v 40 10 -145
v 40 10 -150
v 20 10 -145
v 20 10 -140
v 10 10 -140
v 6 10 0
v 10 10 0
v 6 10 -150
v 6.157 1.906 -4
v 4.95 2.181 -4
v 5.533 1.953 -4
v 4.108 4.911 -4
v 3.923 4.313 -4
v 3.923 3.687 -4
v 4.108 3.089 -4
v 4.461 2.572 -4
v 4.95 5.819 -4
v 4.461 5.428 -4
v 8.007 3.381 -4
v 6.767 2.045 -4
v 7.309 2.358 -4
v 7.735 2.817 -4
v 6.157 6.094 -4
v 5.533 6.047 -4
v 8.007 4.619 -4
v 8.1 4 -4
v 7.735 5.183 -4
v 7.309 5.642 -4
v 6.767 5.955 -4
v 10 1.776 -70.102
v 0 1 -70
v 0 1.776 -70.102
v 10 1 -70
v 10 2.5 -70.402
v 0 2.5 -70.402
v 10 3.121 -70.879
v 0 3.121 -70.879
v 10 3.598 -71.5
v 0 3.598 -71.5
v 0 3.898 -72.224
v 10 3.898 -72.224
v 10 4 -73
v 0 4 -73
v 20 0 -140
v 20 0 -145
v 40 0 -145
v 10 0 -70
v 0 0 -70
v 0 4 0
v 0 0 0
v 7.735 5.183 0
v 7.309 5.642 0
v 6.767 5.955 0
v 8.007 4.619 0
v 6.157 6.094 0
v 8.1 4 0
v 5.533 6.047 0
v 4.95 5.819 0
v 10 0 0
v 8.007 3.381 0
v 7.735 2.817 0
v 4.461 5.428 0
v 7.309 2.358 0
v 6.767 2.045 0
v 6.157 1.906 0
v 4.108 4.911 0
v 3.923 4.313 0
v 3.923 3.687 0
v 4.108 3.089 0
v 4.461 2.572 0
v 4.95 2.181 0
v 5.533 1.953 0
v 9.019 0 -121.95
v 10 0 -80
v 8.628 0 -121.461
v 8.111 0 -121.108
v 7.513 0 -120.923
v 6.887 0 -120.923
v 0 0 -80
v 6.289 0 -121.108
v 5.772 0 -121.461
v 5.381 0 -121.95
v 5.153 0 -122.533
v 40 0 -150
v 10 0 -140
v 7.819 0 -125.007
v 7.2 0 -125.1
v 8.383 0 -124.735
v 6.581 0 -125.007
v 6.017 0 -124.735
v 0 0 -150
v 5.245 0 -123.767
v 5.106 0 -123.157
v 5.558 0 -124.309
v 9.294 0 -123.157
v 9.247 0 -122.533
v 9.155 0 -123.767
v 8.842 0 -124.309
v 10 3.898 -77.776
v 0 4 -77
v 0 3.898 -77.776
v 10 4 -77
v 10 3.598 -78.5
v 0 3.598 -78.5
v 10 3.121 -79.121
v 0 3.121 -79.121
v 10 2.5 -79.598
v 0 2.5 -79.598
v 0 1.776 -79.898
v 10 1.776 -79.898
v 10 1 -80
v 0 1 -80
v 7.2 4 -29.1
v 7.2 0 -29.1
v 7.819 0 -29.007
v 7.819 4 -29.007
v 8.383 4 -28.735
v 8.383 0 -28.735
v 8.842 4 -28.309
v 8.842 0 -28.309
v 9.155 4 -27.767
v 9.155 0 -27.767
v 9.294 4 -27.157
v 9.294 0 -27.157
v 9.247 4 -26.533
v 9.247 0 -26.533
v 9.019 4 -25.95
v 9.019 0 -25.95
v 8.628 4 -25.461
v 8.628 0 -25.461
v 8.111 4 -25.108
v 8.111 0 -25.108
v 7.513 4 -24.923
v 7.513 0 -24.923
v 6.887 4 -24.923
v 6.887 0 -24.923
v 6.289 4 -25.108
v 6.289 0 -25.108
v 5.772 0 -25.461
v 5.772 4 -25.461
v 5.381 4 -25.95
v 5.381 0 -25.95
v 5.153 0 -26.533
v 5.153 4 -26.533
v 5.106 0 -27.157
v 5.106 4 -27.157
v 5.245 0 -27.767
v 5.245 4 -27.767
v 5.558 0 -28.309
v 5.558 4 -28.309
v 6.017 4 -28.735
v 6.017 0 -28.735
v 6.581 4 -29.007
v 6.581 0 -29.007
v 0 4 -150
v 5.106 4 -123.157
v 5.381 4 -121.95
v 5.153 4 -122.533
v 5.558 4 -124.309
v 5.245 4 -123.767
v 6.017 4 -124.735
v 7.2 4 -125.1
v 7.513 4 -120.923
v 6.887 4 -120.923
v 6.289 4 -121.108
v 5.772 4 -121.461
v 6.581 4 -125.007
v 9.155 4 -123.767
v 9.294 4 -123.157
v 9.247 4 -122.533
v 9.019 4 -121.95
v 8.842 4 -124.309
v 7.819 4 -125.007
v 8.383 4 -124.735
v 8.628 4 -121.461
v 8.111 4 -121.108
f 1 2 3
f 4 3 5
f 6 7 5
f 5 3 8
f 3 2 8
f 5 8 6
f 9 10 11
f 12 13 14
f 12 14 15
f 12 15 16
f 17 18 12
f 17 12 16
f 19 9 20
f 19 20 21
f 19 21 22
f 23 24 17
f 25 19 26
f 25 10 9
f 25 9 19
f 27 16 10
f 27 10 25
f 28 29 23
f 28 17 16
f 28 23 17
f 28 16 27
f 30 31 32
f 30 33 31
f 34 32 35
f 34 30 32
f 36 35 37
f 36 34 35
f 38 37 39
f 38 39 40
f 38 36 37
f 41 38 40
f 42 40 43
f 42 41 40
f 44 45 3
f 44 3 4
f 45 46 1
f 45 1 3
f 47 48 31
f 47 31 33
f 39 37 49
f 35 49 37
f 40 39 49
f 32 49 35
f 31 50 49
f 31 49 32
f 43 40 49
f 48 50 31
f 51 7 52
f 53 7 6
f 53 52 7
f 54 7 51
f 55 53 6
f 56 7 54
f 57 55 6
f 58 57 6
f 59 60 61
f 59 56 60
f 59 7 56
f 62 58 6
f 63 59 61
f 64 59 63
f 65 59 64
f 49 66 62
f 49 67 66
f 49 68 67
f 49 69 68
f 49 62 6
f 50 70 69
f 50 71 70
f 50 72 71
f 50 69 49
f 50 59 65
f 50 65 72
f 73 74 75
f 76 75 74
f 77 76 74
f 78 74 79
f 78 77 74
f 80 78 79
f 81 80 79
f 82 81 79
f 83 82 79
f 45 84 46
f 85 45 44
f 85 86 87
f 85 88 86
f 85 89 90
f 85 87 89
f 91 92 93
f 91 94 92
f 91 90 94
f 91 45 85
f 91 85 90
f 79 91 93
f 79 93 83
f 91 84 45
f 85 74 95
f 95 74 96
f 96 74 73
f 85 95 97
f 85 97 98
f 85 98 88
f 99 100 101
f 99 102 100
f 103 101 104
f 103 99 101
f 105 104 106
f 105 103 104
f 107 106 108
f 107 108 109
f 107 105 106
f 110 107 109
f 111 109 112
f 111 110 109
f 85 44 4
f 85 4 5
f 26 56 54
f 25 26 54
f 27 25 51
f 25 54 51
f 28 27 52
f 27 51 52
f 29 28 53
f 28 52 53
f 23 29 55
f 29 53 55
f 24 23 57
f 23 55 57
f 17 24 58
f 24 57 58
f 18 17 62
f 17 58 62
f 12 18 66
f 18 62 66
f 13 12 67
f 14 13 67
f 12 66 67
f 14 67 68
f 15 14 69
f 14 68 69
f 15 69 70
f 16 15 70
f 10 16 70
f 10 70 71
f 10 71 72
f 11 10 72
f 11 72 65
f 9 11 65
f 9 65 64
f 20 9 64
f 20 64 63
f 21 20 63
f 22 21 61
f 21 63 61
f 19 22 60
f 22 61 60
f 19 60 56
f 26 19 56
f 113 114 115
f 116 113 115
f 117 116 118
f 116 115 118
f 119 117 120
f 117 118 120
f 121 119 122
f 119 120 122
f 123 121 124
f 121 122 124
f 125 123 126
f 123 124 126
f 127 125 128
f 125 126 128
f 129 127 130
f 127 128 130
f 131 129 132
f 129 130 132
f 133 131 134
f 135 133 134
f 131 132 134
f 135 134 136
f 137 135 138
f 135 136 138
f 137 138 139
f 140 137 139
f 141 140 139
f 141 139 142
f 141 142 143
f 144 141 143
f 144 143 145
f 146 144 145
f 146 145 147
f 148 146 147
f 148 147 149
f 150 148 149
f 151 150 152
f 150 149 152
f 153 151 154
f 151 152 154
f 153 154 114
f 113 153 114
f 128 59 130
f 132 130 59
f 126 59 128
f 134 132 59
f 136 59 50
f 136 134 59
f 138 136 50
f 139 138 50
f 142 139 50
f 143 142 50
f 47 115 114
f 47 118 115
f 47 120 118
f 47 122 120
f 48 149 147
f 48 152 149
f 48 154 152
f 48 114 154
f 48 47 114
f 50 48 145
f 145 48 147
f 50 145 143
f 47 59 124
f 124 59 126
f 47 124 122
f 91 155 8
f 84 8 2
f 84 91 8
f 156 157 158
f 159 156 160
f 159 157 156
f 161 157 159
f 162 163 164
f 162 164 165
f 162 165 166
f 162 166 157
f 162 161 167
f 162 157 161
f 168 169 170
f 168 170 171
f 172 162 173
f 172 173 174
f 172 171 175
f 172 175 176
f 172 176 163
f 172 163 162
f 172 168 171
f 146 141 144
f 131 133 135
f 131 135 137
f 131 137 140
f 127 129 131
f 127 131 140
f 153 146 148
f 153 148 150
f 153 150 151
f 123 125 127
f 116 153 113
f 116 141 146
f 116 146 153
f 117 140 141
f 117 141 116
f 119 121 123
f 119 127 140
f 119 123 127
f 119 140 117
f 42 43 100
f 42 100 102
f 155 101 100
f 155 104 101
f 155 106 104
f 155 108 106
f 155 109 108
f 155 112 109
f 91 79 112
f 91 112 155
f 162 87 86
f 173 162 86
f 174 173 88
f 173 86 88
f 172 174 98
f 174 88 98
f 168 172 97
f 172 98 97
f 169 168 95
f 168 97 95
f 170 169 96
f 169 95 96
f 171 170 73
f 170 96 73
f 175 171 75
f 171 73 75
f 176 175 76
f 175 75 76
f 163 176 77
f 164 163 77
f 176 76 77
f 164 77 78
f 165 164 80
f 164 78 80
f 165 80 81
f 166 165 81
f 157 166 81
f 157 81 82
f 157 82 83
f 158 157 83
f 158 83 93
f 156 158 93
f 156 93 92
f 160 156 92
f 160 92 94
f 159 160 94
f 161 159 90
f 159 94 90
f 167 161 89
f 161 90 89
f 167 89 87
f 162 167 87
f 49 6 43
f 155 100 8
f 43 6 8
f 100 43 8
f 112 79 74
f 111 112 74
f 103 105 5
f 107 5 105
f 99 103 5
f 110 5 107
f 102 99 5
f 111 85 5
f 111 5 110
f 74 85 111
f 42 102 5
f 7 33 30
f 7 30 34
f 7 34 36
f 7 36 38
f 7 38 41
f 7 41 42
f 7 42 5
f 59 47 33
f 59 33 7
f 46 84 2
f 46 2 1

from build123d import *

# Parameters (mm, degrees)
DODANIE_WYCI_GNI_CIE1_DEPTH = 10
SZKIC2_R                    = 2.1
WYTNIJ_WYCI_GNI_CIE1_DEPTH  = 4
SZKIC3_R                    = 2.1
WYTNIJ_WYCI_GNI_CIE2_DEPTH  = 4
SFAZOWANIE1_SIZE            = 6
SZKIC4_W                    = 10
SZKIC4_H                    = 10
WYTNIJ_WYCI_GNI_CIE3_DEPTH  = 4
ZAOKR_GLENIE1_R             = 3


with BuildPart() as part:
    # Szkic1 → Dodanie-wyciągnięcie1 (new body)
    with BuildSketch(Plane(origin=(0, 0, 0), x_dir=(1, 0, 0), z_dir=(0, 1, 0))):
        Polygon((0, 0), (0, 150), (40, 150), (40, 145), (20, 145), (20, 140), (10, 140), (10, 0), align=None)
    extrude(amount=DODANIE_WYCI_GNI_CIE1_DEPTH)

    # Szkic2 → Wytnij-wyciągnięcie1 (cut)
    with BuildSketch(Plane.XZ):
        with Locations(Location((7.2, -27, 0), (0, 0, 270))):
            Circle(SZKIC2_R)
        with Locations(Location((7.2, -123, 0), (0, 0, 270))):
            Circle(SZKIC2_R)
    extrude(amount=-WYTNIJ_WYCI_GNI_CIE1_DEPTH, mode=Mode.SUBTRACT)

    # Szkic3 → Wytnij-wyciągnięcie2 (cut)
    with BuildSketch(Plane.XY):
        with Locations((6, 4)):
            Circle(SZKIC3_R)
    extrude(amount=-WYTNIJ_WYCI_GNI_CIE2_DEPTH, mode=Mode.SUBTRACT)

    # Sfazowanie1
    sfazowanie1_edges = [part.edges().sort_by_distance(p)[0] for p in [
        (0, 10, -75),
    ]]
    chamfer(sfazowanie1_edges, length=SFAZOWANIE1_SIZE)

    # Szkic4 → Wytnij-wyciągnięcie3 (cut)
    with BuildSketch(Plane.XZ):
        with Locations((5, -75)):
            Rectangle(SZKIC4_W, SZKIC4_H)
    extrude(amount=-WYTNIJ_WYCI_GNI_CIE3_DEPTH, mode=Mode.SUBTRACT)

    # Zaokrąglenie1
    zaokr_glenie1_edges = [part.edges().sort_by_distance(p)[0] for p in [
        (5, 4, -70),
        (5, 4, -80),
    ]]
    fillet(zaokr_glenie1_edges, radius=ZAOKR_GLENIE1_R)


solid = part.part
